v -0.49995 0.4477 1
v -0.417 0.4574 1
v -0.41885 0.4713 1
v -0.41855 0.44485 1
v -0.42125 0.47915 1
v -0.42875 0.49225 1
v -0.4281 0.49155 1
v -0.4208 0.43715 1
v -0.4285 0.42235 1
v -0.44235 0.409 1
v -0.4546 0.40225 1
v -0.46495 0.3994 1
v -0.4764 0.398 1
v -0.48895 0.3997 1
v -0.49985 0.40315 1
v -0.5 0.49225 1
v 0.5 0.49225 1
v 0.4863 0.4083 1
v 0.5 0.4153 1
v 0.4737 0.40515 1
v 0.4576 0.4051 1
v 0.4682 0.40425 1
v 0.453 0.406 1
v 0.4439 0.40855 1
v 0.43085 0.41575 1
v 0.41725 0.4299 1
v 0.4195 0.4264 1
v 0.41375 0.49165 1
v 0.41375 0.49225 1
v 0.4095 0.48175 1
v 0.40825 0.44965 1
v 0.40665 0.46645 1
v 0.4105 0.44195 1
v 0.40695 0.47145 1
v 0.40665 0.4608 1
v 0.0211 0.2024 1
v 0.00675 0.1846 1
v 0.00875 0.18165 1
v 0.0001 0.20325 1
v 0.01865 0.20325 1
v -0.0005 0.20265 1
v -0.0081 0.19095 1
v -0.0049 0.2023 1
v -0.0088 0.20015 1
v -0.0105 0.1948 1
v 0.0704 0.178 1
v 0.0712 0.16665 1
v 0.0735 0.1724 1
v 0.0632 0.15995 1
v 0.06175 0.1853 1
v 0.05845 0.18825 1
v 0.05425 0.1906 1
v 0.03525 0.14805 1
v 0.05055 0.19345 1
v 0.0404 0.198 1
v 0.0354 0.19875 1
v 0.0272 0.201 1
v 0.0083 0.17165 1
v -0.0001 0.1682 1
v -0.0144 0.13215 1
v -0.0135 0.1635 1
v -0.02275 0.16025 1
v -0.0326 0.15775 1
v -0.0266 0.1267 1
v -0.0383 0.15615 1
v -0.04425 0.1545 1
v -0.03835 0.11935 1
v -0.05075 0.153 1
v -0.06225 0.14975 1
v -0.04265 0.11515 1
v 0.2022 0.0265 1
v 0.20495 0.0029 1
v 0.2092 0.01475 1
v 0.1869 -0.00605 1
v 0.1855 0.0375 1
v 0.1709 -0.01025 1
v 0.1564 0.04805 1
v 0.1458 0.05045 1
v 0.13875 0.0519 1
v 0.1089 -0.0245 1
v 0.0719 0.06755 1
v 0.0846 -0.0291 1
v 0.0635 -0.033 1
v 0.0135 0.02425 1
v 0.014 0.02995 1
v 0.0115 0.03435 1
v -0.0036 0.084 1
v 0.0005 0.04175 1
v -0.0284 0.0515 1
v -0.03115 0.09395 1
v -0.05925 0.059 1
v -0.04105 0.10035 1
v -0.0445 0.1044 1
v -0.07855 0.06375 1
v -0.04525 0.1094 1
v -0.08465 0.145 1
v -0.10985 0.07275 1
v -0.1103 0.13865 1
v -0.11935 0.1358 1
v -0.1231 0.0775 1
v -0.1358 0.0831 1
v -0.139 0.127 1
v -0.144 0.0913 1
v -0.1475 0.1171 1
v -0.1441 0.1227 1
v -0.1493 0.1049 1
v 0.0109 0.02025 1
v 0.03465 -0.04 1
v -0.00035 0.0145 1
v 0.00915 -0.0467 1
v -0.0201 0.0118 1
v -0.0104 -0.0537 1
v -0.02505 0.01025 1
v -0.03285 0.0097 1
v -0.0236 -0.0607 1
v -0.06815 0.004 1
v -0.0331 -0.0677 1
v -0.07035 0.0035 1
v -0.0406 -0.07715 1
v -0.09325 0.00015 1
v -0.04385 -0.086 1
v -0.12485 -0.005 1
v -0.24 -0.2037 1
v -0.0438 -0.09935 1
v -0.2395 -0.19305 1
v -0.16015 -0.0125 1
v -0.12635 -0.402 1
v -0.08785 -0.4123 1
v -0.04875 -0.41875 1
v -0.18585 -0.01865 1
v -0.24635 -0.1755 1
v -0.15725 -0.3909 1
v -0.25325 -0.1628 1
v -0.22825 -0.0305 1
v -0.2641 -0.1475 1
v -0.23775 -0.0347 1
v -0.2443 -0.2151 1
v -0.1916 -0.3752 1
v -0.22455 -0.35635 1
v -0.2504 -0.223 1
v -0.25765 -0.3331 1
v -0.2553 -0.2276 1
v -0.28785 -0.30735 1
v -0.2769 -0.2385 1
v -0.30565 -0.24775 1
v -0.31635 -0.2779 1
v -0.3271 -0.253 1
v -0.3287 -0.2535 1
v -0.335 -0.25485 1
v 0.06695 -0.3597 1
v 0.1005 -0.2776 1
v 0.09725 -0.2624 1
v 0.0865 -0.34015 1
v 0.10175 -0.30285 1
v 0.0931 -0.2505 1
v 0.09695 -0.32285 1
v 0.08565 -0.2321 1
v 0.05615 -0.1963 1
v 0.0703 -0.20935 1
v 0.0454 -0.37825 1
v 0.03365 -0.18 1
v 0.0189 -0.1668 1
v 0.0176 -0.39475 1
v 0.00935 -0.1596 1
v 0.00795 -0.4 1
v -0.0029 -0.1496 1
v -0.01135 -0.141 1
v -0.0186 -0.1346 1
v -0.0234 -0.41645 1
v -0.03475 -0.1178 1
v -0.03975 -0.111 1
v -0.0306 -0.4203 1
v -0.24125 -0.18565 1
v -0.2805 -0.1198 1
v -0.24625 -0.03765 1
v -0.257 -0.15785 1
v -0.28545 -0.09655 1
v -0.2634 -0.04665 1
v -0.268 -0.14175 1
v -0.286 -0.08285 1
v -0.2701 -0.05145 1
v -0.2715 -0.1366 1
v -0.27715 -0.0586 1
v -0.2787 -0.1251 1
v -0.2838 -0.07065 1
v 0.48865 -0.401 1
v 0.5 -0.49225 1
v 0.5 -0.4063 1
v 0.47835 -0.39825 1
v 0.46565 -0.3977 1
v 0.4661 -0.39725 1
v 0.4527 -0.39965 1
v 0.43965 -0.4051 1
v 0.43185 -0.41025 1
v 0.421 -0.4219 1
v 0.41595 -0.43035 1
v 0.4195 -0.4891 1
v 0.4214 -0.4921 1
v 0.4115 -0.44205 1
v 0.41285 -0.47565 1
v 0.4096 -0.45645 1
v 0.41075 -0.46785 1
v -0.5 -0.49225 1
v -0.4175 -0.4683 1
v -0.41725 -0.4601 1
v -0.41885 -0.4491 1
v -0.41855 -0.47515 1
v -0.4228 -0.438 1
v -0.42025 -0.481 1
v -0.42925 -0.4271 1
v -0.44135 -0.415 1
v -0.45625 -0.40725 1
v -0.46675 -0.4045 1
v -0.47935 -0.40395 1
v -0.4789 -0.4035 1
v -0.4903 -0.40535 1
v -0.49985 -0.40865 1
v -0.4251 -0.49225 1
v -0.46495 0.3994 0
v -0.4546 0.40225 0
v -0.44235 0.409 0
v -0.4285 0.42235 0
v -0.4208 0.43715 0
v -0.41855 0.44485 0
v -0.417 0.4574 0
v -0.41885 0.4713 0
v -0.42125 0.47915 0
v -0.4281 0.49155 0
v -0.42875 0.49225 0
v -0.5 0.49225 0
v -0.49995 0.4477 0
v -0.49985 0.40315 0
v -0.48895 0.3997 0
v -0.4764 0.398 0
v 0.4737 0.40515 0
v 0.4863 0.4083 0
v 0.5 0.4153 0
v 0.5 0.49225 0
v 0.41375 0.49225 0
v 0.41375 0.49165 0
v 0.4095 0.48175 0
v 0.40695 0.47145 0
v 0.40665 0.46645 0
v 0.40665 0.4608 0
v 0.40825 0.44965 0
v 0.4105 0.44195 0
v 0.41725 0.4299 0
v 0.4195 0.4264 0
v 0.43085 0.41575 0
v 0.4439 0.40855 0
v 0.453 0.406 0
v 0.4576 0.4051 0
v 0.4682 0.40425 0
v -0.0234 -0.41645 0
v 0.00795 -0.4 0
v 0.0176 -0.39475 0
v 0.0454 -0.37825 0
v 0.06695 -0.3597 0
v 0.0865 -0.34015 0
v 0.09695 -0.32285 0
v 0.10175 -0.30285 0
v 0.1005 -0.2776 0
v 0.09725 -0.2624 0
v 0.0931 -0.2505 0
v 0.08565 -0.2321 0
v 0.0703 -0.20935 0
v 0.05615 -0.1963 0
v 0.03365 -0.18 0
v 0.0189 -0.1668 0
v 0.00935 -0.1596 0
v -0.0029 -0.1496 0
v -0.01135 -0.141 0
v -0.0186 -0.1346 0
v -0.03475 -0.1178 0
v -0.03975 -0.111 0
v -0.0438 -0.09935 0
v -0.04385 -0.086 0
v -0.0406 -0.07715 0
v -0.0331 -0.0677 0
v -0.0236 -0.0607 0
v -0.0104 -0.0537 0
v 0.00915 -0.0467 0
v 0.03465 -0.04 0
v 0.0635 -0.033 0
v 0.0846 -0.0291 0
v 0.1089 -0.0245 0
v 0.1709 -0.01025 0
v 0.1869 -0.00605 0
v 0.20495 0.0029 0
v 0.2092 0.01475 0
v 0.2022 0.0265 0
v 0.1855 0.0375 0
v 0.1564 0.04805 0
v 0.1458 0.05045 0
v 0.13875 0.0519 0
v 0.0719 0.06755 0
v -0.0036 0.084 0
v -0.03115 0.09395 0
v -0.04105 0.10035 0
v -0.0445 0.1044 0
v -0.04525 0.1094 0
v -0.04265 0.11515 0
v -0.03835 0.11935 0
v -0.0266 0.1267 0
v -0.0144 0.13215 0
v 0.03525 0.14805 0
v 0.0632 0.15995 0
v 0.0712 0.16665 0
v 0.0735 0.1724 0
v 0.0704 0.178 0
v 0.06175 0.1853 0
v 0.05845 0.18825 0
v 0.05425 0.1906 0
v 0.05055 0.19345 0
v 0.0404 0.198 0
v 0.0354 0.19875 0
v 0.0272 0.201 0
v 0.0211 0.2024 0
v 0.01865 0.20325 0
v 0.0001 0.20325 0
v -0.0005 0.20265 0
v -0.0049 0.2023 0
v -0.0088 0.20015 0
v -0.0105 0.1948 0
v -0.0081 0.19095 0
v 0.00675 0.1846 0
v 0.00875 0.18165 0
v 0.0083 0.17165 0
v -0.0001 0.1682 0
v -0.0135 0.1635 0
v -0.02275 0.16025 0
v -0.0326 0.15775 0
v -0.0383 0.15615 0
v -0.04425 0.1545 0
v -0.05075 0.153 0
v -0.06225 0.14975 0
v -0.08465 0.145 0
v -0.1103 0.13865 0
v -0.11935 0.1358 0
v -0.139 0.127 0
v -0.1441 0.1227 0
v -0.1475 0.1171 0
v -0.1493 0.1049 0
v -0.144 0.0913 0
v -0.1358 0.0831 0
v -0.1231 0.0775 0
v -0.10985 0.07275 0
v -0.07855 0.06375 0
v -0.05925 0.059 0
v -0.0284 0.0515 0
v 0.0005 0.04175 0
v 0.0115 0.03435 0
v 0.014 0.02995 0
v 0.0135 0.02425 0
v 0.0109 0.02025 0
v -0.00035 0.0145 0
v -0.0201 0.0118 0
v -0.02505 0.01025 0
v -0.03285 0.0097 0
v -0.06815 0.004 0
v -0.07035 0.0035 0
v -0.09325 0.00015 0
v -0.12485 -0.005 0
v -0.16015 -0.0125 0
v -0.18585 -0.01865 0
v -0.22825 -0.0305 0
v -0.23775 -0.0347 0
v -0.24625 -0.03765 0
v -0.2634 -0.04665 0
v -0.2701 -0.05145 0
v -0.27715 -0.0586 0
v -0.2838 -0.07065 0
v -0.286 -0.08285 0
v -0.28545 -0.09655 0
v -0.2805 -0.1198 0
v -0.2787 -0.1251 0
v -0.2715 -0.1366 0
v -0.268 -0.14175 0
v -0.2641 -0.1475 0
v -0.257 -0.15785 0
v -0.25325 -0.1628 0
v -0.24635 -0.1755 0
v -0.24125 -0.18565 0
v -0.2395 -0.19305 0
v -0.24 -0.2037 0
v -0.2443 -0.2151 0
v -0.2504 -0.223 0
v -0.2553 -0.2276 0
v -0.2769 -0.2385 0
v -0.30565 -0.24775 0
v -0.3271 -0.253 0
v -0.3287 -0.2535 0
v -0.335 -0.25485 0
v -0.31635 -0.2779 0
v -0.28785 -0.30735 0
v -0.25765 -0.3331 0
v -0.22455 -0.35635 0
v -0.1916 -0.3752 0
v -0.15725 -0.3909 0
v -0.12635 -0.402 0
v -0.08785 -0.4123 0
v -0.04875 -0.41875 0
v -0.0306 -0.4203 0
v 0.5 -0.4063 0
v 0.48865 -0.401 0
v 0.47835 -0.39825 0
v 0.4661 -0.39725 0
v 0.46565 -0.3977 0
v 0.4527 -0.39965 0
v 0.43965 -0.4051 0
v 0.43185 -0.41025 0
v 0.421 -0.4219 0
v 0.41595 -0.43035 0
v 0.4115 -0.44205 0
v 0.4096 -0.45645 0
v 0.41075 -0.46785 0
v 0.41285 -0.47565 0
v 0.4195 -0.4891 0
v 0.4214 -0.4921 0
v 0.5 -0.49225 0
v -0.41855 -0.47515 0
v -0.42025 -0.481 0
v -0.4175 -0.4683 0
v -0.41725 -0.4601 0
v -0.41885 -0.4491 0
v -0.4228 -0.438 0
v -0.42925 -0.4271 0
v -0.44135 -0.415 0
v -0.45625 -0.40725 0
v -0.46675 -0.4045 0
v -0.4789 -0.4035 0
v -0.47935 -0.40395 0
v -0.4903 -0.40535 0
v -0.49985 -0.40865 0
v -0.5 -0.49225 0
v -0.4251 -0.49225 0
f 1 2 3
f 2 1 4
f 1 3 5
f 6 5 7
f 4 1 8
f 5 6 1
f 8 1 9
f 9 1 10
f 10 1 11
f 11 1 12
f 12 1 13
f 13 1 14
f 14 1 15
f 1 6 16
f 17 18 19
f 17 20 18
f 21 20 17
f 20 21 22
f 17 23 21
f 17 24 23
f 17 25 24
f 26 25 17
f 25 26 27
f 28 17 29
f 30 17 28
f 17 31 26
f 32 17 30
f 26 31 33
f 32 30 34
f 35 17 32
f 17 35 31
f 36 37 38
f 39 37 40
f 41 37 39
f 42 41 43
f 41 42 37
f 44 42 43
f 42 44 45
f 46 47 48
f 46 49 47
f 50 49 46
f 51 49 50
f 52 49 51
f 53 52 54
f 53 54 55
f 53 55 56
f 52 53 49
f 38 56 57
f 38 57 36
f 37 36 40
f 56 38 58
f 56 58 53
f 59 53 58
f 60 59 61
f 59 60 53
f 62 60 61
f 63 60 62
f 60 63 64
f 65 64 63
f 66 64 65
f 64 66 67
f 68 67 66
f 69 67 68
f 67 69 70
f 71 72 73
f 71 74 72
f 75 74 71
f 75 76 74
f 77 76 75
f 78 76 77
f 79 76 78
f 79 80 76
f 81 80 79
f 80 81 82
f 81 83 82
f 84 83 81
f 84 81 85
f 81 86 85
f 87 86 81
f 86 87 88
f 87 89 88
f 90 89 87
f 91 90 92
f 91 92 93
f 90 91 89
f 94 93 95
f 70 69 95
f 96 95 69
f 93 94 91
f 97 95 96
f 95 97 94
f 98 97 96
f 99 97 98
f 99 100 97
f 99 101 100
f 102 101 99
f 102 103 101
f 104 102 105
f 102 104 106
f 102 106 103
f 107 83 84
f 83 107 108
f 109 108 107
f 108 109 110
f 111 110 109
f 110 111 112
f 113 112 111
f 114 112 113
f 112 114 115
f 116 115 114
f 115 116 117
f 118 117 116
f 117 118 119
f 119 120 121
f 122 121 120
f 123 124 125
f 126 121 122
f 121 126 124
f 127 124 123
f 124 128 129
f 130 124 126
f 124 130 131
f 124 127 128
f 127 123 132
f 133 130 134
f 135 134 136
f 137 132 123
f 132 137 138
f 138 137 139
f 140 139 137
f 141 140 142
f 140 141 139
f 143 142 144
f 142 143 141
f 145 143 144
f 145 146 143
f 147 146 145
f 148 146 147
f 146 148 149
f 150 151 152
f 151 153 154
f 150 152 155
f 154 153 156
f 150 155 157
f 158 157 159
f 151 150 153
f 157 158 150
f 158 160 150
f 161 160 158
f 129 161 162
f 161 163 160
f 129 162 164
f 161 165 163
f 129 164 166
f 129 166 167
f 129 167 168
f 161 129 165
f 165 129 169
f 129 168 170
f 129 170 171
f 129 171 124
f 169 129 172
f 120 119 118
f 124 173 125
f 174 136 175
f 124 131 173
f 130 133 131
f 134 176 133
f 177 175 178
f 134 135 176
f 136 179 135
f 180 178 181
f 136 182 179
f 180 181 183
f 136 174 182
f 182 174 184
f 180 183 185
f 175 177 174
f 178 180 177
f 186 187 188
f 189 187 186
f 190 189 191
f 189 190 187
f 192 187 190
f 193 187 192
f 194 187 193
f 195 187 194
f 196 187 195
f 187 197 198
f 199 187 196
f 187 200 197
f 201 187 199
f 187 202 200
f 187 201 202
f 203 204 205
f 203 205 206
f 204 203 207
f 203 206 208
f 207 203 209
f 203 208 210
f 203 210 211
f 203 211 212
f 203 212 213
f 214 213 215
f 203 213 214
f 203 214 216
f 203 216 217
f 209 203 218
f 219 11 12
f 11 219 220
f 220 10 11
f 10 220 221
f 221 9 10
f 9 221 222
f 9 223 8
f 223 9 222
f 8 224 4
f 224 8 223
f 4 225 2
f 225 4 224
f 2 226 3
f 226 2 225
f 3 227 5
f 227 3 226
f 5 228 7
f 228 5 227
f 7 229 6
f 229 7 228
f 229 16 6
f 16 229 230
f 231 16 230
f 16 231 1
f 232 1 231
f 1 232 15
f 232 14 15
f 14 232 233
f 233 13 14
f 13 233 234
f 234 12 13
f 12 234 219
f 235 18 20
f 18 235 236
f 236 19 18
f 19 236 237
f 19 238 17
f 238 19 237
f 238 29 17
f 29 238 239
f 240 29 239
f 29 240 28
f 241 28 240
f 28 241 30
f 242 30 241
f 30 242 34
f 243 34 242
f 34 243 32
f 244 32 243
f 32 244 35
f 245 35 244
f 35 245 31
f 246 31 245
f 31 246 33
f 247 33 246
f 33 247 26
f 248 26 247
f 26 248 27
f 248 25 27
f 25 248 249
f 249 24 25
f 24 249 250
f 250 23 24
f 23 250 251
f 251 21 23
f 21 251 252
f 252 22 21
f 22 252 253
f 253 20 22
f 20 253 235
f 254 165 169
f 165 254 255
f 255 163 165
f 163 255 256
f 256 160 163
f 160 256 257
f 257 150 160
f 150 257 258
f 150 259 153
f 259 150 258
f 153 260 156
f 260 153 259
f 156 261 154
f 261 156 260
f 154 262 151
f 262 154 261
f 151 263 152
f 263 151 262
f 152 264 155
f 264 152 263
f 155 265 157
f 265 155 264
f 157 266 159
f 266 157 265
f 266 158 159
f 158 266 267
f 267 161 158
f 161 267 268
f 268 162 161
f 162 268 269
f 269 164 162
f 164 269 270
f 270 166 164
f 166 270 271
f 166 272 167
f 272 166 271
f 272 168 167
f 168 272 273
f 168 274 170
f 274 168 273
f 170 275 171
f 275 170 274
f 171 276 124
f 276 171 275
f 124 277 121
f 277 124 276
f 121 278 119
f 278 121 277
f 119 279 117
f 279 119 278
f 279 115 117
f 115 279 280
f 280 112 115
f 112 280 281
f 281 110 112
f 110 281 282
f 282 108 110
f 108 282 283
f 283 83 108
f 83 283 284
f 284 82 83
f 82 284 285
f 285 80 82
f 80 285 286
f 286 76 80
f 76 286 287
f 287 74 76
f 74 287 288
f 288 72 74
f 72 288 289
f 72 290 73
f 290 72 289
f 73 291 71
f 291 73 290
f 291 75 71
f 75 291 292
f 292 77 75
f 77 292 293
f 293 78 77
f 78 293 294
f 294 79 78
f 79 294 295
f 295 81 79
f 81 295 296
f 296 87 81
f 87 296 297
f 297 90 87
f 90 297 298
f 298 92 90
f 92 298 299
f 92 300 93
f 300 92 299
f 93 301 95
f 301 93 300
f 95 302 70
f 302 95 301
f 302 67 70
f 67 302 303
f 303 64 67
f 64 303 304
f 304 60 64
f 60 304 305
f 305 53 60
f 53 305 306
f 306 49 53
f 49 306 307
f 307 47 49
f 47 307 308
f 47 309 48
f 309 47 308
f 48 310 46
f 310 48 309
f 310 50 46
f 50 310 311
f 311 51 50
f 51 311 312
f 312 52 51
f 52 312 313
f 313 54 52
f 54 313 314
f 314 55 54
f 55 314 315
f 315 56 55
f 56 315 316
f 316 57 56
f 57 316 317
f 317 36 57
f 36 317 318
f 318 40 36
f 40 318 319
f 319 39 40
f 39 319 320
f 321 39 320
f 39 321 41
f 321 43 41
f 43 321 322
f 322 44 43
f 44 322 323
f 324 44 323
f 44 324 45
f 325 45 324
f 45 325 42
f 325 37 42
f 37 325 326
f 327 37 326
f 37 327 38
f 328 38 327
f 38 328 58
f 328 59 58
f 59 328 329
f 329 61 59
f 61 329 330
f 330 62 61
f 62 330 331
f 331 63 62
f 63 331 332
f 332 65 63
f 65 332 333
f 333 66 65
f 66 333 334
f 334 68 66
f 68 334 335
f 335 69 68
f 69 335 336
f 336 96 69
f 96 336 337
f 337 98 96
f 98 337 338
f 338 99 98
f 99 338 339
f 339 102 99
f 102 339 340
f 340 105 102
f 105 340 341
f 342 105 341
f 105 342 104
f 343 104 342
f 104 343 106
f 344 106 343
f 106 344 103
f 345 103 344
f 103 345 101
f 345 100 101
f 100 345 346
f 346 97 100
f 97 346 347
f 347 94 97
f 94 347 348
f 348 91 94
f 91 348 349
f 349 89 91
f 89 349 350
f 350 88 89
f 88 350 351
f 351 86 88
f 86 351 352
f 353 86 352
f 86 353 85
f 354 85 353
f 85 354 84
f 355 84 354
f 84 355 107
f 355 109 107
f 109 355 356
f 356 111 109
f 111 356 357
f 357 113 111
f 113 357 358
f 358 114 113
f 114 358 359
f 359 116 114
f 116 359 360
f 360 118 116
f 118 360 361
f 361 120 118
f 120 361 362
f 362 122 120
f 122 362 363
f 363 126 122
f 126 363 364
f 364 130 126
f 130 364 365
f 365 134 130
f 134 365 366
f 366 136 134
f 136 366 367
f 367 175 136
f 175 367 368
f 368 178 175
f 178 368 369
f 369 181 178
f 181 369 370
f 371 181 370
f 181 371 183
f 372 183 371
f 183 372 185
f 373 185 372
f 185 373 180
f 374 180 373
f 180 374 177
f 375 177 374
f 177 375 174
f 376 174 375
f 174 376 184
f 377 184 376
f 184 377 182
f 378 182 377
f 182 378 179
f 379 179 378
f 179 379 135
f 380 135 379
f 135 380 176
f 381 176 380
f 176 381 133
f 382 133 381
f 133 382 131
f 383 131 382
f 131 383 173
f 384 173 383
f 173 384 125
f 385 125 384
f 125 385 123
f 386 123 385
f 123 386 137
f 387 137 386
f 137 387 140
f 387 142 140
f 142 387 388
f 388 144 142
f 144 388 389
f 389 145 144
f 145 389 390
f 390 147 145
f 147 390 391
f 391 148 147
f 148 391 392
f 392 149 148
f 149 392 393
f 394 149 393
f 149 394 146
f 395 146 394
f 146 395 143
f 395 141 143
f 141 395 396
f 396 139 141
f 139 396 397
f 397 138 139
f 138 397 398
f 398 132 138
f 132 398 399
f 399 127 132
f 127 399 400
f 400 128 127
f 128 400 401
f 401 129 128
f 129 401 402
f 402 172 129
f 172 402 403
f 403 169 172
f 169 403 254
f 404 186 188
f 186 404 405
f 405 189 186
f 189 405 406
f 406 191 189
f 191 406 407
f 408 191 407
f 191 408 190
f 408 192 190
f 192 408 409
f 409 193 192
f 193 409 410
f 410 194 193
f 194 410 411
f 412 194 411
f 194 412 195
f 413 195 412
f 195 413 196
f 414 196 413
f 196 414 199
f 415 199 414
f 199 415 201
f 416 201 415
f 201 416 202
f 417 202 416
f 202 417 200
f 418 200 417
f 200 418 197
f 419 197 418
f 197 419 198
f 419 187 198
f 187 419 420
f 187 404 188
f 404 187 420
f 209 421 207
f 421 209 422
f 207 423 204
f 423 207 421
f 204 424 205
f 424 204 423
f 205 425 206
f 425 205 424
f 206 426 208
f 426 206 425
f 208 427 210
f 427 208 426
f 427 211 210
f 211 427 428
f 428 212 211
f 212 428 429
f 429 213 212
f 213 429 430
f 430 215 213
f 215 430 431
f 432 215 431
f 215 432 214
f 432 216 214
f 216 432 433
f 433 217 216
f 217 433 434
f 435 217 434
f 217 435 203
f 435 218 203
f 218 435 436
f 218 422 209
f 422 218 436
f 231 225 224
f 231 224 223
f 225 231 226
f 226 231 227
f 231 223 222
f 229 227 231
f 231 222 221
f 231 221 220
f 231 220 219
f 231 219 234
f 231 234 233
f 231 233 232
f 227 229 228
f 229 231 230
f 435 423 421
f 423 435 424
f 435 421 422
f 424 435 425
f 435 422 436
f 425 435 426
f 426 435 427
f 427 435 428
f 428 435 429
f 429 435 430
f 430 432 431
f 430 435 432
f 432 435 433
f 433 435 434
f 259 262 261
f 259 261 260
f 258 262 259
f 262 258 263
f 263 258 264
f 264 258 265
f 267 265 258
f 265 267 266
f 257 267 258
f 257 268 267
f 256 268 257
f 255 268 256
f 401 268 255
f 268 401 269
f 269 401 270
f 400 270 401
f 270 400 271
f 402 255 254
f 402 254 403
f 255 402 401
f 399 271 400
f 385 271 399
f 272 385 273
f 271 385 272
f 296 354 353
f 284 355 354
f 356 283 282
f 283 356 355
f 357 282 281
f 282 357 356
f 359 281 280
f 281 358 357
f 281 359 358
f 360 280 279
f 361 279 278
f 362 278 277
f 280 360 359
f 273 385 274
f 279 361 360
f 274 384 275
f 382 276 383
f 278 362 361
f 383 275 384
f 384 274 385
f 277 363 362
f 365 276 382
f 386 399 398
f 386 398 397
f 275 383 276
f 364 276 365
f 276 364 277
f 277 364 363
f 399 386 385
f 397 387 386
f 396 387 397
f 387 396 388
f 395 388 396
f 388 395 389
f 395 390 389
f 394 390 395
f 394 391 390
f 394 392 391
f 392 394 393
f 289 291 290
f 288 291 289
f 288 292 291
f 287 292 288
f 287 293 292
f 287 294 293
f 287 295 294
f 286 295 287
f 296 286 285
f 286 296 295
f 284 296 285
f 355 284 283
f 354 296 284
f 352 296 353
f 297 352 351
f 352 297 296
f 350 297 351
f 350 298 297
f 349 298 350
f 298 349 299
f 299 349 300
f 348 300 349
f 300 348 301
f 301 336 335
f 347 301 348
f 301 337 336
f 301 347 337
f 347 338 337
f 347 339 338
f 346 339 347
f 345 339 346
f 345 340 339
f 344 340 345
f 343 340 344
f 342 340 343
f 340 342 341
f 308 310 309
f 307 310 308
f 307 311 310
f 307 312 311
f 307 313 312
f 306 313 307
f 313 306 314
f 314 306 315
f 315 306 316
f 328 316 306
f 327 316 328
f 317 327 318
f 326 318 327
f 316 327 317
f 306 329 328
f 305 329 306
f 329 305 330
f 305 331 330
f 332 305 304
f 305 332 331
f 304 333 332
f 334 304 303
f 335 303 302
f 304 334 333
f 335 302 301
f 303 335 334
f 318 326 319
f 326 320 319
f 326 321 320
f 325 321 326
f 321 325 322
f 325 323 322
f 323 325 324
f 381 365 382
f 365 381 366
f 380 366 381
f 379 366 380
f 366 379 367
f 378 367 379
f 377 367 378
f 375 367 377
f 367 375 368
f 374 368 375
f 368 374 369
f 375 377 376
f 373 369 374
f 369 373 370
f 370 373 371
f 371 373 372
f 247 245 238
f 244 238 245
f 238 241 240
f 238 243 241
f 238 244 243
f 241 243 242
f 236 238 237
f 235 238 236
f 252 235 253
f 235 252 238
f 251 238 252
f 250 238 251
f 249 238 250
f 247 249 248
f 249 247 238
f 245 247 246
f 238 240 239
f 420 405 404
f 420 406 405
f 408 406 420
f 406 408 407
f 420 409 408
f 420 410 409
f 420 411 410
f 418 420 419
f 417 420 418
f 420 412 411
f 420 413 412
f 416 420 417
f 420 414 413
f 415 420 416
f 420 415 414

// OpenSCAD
module CrickCoin3purple_1()
{
 /* Generated by trace2scad version 20150415
    http://aggregate.org/MAKE/TRACE2SCAD/
    Optimized model has 222/2741 original points
 */
 color([0.5, 0.5, 0.5])
 assign(minx=0) /* polygon minx=0 */
 assign(miny=0) /* polygon miny=0 */
 assign(maxx=20000) /* polygon maxx=20000 */
 assign(maxy=19690) /* polygon maxy=19690 */
 assign(dx=maxx-minx)
 assign(dy=maxy-miny)
 assign(maxd=((dx>dy)?dx:dy))
 scale([1/maxd, 1/maxd, 1])
 translate([-minx-dx/2, -miny-dy/2, 0])
 linear_extrude(height=1, convexity=222)
 union() {
  union() {
   polygon([[1,18799],[3,17908],[221,17839],[472,17805],[701,17833],[908,17890],[1153,18025],[1430,18292],[1584,18588],[1629,18742],[1660,18993],[1623,19271],[1575,19428],[1438,19676],[1425,19690],[0,19690]], convexity=5);
   polygon([[18275,19684],[18275,19678],[18190,19480],[18139,19274],[18133,19174],[18133,19061],[18165,18838],[18210,18684],[18345,18443],[18390,18373],[18617,18160],[18878,18016],[19060,17965],[19152,17947],[19364,17930],[19474,17948],[19726,18011],[20000,18151],[20000,19690],[18275,19690]], convexity=7);
   polygon([[9996,13904],[9990,13898],[9902,13891],[9824,13848],[9790,13741],[9838,13664],[10135,13537],[10175,13478],[10166,13278],[9998,13209],[9730,13115],[9545,13050],[9348,13000],[9234,12968],[9115,12935],[8985,12905],[8755,12840],[8307,12745],[7794,12618],[7613,12561],[7220,12385],[7118,12299],[7050,12187],[7014,11943],[7120,11671],[7284,11507],[7538,11395],[7803,11300],[8429,11120],[8815,11025],[9432,10875],[10010,10680],[10230,10532],[10280,10444],[10270,10330],[10218,10250],[9993,10135],[9598,10081],[9499,10050],[9343,10039],[8637,9925],[8593,9915],[8135,9848],[7503,9745],[6797,9595],[6283,9472],[5435,9235],[5245,9151],[5075,9092],[4732,8912],[4598,8816],[4457,8673],[4324,8432],[4280,8188],[4291,7914],[4390,7449],[4426,7343],[4570,7113],[4640,7010],[4718,6895],[4860,6688],[4935,6589],[5073,6335],[5175,6132],[5210,5984],[5200,5771],[5114,5543],[4992,5385],[4894,5293],[4462,5075],[3887,4890],[3458,4785],[3426,4775],[3300,4748],[3673,4287],[4243,3698],[4847,3183],[5509,2718],[6168,2341],[6855,2027],[7473,1805],[8243,1599],[9025,1470],[9388,1439],[9532,1516],[10159,1845],[10352,1950],[10908,2280],[11339,2651],[11730,3042],[11939,3388],[12035,3788],[12010,4293],[11945,4597],[11862,4835],[11713,5203],[11406,5658],[11123,5919],[10673,6245],[10378,6509],[10187,6653],[9942,6853],[9773,7025],[9628,7153],[9305,7489],[9205,7625],[9124,7858],[9123,8125],[9188,8302],[9338,8491],[9528,8631],[9792,8771],[10183,8911],[10693,9045],[11270,9185],[11692,9263],[12178,9355],[13418,9640],[13738,9724],[14099,9903],[14184,10140],[14044,10375],[13710,10595],[13128,10806],[12916,10854],[12775,10883],[11438,11196],[9928,11525],[9377,11724],[9179,11852],[9110,11933],[9095,12033],[9147,12148],[9233,12232],[9468,12379],[9712,12488],[10705,12806],[11264,13044],[11424,13178],[11470,13293],[11408,13405],[11235,13551],[11169,13610],[11085,13657],[11011,13714],[10808,13805],[10708,13820],[10544,13865],[10422,13893],[10373,13910],[10002,13910]], convexity=16);
   polygon([[19317,1895],[19313,1891],[19054,1852],[18793,1743],[18637,1640],[18420,1407],[18319,1238],[18230,1004],[18192,716],[18215,488],[18257,332],[18390,63],[18428,3],[20000,0],[20000,1719],[19773,1825],[19567,1880],[19322,1900]], convexity=6);
   polygon([[417,1770],[413,1766],[194,1738],[3,1672],[0,0],[1498,0],[1595,225],[1629,342],[1650,479],[1655,643],[1623,863],[1544,1085],[1415,1303],[1173,1545],[875,1700],[665,1755],[422,1775]], convexity=5);
  }
 }
}

module CrickCoin3purple()
{
 /* all layers combined, scaled to within a 1mm cube */
 scale([1, 1, 1/1])
 difference() {
  union() {
   scale([1,1,2]) translate([0,0,-0.5]) CrickCoin3purple_1();
  }
  translate([0,0,-2]) cube([2,2,4],center=true);
 }
}
CrickCoin3purple();
